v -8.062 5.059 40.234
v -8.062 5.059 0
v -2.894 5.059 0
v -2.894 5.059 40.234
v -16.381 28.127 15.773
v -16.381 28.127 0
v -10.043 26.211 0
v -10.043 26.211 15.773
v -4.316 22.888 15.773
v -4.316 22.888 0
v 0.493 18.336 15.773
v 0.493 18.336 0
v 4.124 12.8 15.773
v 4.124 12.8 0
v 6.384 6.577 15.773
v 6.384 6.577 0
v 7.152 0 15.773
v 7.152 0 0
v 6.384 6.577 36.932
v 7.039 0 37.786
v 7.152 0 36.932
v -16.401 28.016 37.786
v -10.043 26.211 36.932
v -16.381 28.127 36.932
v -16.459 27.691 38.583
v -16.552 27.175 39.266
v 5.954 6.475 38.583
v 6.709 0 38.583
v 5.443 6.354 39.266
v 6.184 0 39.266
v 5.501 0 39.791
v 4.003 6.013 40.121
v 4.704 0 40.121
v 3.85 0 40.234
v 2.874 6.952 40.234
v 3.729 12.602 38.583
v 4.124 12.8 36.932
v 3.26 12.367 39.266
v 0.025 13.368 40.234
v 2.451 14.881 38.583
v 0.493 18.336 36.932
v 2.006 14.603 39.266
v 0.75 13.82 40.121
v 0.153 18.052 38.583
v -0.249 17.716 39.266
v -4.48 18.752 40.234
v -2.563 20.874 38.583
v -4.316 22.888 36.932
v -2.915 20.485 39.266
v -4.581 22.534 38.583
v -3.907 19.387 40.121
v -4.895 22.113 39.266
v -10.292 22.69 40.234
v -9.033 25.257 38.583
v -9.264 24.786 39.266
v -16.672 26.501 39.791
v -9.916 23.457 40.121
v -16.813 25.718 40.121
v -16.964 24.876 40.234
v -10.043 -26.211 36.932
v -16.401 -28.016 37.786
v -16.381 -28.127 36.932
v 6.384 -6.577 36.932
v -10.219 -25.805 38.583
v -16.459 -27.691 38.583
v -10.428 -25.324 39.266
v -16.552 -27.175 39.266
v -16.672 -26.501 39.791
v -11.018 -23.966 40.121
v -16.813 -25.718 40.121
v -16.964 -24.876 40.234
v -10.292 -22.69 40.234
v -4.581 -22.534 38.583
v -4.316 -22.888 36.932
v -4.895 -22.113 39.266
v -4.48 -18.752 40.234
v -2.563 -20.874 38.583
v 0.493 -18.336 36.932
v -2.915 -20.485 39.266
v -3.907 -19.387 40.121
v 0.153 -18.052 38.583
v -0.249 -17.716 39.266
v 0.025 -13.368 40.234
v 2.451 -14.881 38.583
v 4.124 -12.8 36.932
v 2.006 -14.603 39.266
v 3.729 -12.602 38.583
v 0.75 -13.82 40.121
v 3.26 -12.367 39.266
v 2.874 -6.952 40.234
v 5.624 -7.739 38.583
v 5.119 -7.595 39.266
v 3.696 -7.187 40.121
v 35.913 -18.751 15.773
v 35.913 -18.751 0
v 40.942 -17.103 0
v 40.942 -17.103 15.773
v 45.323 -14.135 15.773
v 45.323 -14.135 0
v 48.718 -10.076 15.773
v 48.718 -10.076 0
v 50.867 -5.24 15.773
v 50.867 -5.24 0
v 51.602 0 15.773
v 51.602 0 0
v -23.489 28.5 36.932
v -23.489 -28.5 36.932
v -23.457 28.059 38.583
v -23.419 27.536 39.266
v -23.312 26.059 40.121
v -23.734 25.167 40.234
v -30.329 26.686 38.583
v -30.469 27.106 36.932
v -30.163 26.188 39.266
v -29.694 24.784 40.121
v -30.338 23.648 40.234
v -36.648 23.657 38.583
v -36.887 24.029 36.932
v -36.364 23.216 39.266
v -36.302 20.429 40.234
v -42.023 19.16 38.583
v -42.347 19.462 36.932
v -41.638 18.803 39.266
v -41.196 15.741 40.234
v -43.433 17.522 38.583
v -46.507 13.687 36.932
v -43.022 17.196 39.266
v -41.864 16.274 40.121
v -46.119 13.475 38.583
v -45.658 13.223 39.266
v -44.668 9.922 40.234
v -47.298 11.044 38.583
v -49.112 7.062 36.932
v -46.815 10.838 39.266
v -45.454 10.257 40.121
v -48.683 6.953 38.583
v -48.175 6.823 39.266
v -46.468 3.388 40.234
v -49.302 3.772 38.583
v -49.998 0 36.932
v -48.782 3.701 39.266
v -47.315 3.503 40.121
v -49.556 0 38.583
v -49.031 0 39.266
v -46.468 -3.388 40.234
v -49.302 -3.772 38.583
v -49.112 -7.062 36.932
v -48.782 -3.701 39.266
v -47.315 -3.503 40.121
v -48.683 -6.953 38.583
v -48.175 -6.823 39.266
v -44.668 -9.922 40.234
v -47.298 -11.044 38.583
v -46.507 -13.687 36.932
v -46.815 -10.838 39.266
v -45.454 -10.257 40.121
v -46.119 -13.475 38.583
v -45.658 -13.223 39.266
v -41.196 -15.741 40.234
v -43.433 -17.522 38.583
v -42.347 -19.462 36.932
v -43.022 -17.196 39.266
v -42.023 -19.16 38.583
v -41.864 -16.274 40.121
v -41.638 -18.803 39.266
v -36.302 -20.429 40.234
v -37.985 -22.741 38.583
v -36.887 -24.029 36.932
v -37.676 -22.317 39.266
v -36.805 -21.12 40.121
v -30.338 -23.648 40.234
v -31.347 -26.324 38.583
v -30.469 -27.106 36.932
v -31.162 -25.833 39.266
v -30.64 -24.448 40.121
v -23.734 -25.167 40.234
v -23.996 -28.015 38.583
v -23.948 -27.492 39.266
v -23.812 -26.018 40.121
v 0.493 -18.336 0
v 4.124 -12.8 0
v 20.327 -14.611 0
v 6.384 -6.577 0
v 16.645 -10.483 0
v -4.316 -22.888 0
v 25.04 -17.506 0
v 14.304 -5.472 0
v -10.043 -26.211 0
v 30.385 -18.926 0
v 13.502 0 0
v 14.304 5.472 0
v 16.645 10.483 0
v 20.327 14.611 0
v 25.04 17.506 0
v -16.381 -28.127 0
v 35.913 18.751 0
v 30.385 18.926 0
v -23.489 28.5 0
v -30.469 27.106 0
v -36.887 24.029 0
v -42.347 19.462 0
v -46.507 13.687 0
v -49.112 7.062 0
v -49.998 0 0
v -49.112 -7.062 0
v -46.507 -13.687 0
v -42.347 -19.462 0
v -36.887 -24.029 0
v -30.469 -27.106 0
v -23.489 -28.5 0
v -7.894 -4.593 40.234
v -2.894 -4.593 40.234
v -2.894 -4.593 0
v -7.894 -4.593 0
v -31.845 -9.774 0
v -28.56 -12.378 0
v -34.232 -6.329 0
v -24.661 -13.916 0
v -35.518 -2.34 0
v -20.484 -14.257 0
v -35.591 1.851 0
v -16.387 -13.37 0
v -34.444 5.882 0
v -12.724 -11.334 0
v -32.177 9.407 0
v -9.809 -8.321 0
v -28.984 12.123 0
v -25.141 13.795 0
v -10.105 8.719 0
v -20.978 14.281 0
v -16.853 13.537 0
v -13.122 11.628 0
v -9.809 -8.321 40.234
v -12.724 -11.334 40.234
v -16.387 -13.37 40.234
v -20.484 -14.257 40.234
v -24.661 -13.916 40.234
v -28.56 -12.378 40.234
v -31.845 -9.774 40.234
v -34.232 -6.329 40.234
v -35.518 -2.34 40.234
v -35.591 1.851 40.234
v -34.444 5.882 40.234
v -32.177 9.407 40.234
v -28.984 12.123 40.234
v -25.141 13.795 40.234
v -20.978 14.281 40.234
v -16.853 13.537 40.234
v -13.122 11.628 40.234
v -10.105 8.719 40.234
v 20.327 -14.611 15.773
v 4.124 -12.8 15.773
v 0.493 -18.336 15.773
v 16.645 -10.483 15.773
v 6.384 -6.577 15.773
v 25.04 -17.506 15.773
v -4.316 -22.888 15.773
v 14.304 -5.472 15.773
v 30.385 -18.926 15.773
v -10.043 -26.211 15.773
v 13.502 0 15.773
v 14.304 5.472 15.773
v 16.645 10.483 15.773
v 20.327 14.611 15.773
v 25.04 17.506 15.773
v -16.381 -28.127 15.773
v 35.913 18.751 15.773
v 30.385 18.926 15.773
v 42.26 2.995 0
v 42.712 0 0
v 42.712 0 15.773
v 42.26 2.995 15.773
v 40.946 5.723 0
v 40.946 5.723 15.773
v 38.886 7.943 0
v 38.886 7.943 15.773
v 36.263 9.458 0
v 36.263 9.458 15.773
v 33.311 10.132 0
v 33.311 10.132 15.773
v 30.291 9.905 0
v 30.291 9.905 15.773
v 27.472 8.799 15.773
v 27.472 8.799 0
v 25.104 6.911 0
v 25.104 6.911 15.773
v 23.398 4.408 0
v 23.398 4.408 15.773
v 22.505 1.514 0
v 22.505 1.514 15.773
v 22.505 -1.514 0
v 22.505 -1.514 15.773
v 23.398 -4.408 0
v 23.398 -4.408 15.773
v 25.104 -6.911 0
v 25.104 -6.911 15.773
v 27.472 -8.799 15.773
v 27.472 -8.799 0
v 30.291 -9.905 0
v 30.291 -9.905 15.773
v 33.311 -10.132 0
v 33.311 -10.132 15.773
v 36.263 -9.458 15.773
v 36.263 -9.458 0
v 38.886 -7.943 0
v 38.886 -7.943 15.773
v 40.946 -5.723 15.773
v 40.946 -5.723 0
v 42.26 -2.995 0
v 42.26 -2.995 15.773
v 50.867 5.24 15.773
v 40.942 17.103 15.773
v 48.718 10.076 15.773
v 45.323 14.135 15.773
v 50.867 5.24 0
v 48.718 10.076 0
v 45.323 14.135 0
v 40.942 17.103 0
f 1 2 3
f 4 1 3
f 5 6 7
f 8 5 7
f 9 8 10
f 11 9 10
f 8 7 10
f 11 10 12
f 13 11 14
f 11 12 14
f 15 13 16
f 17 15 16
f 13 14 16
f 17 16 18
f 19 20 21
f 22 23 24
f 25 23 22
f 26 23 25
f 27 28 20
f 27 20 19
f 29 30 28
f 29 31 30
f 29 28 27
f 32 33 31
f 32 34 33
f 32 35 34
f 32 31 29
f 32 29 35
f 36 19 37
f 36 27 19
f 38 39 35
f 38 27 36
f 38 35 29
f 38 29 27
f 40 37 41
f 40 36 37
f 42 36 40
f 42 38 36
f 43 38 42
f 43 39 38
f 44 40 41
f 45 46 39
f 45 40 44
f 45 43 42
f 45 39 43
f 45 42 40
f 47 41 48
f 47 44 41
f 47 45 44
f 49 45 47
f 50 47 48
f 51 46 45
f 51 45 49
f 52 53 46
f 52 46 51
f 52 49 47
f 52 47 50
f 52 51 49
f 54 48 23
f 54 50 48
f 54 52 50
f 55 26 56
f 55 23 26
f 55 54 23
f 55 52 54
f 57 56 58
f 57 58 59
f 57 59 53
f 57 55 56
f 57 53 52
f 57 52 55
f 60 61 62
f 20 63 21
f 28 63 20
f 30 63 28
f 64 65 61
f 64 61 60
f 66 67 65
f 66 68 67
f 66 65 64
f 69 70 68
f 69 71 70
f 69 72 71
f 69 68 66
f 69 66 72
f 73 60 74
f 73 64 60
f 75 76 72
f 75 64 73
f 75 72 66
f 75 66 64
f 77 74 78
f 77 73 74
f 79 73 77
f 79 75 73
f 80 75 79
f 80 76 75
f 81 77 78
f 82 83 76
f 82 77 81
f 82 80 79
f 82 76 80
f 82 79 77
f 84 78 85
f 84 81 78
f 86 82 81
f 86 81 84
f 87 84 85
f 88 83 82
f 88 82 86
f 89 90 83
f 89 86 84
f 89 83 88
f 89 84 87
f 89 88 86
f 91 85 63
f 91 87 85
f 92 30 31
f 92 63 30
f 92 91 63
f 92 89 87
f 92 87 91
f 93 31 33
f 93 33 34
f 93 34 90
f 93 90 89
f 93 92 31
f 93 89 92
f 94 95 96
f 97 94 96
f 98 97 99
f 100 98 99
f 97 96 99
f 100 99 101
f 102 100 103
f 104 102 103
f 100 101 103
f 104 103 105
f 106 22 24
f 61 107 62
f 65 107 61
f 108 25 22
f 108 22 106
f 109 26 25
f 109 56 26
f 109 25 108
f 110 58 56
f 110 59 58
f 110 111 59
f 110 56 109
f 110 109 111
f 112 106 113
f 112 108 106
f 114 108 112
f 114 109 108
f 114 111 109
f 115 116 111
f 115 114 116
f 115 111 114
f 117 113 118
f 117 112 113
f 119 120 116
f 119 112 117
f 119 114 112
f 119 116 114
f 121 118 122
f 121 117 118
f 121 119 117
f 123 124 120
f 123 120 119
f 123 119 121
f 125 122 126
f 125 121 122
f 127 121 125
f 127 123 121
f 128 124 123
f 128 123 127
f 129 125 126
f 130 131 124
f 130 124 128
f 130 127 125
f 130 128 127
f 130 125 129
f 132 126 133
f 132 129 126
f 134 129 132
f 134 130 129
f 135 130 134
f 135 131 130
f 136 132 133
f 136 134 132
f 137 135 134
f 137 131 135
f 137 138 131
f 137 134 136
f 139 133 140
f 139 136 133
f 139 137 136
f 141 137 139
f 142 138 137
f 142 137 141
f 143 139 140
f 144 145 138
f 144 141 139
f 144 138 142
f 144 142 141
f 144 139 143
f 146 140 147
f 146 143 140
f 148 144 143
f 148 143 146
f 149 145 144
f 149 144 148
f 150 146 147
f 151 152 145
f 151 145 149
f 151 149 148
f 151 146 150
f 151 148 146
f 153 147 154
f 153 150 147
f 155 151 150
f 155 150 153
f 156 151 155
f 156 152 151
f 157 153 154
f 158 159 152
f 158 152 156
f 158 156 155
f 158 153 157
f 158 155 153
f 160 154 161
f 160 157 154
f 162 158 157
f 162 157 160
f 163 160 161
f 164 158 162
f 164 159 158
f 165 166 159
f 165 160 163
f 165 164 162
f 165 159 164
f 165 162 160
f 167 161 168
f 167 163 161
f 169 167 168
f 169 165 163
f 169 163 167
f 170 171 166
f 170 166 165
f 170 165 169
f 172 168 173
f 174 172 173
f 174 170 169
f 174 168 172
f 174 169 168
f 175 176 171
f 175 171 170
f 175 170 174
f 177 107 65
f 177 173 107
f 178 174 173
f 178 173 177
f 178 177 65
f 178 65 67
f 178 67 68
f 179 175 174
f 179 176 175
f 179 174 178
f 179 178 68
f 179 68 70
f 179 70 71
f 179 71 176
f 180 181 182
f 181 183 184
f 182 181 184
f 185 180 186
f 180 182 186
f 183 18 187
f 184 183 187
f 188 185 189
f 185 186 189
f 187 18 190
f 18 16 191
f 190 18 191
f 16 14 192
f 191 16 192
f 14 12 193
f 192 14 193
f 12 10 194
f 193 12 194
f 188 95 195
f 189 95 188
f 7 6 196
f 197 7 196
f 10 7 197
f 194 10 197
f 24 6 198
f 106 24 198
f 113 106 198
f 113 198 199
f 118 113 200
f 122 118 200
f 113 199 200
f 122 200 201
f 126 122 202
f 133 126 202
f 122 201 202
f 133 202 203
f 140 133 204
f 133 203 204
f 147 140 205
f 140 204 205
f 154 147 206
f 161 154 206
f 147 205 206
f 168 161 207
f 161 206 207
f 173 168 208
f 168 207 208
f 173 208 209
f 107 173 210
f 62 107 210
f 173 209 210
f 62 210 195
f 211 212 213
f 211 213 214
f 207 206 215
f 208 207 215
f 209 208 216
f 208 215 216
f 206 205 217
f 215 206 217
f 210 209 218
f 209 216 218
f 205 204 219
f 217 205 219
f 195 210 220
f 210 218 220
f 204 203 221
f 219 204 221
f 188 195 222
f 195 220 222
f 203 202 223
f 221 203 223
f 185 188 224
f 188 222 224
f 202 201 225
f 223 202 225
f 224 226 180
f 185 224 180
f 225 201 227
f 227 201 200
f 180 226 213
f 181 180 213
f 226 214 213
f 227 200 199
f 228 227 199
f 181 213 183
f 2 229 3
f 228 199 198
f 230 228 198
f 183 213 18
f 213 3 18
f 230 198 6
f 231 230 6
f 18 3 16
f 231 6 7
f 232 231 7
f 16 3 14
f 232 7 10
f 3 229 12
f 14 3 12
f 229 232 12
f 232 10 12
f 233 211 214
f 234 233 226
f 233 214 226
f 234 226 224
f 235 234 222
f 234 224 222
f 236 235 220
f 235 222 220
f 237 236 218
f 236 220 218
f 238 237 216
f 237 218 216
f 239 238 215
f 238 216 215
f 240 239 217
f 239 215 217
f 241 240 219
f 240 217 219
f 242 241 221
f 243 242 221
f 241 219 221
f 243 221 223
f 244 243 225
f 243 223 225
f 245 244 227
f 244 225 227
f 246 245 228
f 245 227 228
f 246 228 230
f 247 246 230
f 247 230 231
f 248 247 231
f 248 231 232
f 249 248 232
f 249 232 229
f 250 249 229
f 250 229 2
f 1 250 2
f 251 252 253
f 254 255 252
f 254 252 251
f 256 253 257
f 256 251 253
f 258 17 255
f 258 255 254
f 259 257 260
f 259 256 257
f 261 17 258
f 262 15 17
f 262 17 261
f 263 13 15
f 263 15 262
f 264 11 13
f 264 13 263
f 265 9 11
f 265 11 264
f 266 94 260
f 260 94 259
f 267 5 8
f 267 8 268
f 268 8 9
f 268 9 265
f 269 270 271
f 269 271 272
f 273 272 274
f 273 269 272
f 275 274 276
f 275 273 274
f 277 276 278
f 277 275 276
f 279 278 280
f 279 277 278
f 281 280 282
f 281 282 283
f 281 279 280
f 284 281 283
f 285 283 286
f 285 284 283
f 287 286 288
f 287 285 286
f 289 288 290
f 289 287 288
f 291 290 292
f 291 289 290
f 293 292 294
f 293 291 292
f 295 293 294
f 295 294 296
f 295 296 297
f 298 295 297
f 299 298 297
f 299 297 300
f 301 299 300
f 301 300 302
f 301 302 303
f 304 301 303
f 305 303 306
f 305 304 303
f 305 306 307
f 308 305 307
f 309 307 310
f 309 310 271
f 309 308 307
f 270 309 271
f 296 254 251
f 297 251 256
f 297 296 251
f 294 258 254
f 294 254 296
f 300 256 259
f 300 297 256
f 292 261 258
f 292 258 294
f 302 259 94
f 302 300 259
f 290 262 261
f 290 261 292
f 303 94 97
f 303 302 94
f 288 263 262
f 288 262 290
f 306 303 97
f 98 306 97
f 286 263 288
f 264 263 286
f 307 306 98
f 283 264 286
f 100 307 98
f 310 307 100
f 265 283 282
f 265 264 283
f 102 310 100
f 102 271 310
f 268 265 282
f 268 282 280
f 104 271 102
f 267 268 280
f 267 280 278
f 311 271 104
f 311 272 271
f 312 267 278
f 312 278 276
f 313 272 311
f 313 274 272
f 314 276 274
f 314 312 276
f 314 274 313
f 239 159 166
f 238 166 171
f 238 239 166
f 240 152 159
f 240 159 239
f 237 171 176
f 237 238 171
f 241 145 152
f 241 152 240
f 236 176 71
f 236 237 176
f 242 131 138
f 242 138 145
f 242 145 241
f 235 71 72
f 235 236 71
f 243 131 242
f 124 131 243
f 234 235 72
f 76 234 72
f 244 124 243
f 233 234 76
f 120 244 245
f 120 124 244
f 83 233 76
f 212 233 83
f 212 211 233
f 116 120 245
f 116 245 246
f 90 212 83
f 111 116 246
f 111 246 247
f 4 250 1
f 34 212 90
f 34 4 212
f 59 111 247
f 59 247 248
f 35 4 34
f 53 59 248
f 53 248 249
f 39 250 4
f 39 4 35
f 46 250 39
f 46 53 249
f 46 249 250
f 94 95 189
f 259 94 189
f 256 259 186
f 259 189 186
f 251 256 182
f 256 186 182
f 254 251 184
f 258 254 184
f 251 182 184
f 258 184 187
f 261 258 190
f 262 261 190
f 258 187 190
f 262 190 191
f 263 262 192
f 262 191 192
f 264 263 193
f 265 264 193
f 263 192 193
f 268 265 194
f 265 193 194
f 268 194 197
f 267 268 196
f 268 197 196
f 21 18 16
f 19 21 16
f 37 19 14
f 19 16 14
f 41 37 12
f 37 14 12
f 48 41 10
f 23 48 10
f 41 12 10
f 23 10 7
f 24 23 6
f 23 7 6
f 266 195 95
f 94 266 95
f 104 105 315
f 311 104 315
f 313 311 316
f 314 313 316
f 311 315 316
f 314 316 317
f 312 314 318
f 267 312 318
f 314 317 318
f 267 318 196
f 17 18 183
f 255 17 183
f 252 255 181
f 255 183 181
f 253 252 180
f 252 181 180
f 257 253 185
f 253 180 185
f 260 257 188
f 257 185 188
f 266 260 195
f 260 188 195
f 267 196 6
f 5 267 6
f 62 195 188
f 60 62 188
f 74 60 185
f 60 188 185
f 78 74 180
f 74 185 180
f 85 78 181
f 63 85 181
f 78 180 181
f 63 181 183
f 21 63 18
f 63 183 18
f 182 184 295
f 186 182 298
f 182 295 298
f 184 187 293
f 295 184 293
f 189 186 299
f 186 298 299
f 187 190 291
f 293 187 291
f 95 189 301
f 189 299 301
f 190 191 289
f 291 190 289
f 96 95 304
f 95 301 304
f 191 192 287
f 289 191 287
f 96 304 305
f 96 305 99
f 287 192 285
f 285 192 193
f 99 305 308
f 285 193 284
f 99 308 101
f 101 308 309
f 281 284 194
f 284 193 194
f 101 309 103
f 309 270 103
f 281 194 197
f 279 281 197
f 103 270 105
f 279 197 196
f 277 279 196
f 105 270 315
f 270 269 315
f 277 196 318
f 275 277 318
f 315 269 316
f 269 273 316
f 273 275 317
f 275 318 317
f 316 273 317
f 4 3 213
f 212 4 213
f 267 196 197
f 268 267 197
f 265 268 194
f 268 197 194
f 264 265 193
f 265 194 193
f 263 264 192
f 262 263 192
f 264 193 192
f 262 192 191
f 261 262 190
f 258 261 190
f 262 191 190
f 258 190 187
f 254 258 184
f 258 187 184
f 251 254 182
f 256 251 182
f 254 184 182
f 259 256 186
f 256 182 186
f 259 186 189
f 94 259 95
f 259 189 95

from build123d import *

# Parameters (mm, degrees)
F1_DEPTH = 40.2336
F0_R     = 10.16
F2_DEPTH = 15.7734
F3_DEPTH = 15.7734
F4_R     = 3.302


with BuildPart() as f1:
    # F0 (on Top) → F1 (new body)
    with BuildSketch(Plane.XY):
        with BuildLine():
            ThreePointArc((-16.380831, -28.126541), (0.492547, -18.336262), (7.151522, 0))
            ThreePointArc((7.151522, 0), (0.492547, 18.336262), (-16.380831, 28.126541))
            ThreePointArc((-16.380831, 28.126541), (-49.998478, 0), (-16.380831, -28.126541))
        make_face()
        with BuildLine():
            ThreePointArc((-7.894387, -4.593079), (-35.708834, -0.247471), (-8.061593, 5.058921))
            Line((-8.061593, 5.058921), (-2.894178, 5.058921))
            Line((-2.894178, 5.058921), (-2.894178, -4.593079))
            Line((-2.894178, -4.593079), (-6.585919, -4.593079))
            Line((-6.585919, -4.593079), (-7.894387, -4.593079))
        make_face(mode=Mode.SUBTRACT)
    extrude(amount=F1_DEPTH)

    # F4
    f4_edges = [f1.edges().sort_by_distance(p)[0] for p in [
        (-26.466125, 28.126541, 40.2336),
    ]]
    fillet(f4_edges, radius=F4_R)


with BuildPart() as f2:
    # F0 (on Top) → F2 (new body)
    with BuildSketch(Plane.XY):
        with BuildLine():
            ThreePointArc((51.601522, 0), (47.162205, 12.224174), (35.913287, 18.751028))
            ThreePointArc((35.913287, 18.751028), (13.501522, 0), (35.913287, -18.751028))
            ThreePointArc((35.913287, -18.751028), (47.162205, -12.224174), (51.601522, 0))
        make_face()
        with Locations((32.551522, 0)):
            Circle(F0_R, mode=Mode.SUBTRACT)
    extrude(amount=F2_DEPTH)


with BuildPart() as f3:
    # F0 (on Top) → F3 (new body)
    with BuildSketch(Plane.XY):
        with BuildLine():
            ThreePointArc((-16.380831, 28.126541), (0.492547, 18.336262), (7.151522, 0))
            ThreePointArc((7.151522, 0), (0.492547, -18.336262), (-16.380831, -28.126541))
            Line((-16.380831, -28.126541), (35.913287, -18.751028))
            ThreePointArc((35.913287, -18.751028), (13.501522, 0), (35.913287, 18.751028))
            Line((35.913287, 18.751028), (-16.380831, 28.126541))
        make_face()
    extrude(amount=F3_DEPTH)


solid = Compound([f1.part, f2.part, f3.part])
